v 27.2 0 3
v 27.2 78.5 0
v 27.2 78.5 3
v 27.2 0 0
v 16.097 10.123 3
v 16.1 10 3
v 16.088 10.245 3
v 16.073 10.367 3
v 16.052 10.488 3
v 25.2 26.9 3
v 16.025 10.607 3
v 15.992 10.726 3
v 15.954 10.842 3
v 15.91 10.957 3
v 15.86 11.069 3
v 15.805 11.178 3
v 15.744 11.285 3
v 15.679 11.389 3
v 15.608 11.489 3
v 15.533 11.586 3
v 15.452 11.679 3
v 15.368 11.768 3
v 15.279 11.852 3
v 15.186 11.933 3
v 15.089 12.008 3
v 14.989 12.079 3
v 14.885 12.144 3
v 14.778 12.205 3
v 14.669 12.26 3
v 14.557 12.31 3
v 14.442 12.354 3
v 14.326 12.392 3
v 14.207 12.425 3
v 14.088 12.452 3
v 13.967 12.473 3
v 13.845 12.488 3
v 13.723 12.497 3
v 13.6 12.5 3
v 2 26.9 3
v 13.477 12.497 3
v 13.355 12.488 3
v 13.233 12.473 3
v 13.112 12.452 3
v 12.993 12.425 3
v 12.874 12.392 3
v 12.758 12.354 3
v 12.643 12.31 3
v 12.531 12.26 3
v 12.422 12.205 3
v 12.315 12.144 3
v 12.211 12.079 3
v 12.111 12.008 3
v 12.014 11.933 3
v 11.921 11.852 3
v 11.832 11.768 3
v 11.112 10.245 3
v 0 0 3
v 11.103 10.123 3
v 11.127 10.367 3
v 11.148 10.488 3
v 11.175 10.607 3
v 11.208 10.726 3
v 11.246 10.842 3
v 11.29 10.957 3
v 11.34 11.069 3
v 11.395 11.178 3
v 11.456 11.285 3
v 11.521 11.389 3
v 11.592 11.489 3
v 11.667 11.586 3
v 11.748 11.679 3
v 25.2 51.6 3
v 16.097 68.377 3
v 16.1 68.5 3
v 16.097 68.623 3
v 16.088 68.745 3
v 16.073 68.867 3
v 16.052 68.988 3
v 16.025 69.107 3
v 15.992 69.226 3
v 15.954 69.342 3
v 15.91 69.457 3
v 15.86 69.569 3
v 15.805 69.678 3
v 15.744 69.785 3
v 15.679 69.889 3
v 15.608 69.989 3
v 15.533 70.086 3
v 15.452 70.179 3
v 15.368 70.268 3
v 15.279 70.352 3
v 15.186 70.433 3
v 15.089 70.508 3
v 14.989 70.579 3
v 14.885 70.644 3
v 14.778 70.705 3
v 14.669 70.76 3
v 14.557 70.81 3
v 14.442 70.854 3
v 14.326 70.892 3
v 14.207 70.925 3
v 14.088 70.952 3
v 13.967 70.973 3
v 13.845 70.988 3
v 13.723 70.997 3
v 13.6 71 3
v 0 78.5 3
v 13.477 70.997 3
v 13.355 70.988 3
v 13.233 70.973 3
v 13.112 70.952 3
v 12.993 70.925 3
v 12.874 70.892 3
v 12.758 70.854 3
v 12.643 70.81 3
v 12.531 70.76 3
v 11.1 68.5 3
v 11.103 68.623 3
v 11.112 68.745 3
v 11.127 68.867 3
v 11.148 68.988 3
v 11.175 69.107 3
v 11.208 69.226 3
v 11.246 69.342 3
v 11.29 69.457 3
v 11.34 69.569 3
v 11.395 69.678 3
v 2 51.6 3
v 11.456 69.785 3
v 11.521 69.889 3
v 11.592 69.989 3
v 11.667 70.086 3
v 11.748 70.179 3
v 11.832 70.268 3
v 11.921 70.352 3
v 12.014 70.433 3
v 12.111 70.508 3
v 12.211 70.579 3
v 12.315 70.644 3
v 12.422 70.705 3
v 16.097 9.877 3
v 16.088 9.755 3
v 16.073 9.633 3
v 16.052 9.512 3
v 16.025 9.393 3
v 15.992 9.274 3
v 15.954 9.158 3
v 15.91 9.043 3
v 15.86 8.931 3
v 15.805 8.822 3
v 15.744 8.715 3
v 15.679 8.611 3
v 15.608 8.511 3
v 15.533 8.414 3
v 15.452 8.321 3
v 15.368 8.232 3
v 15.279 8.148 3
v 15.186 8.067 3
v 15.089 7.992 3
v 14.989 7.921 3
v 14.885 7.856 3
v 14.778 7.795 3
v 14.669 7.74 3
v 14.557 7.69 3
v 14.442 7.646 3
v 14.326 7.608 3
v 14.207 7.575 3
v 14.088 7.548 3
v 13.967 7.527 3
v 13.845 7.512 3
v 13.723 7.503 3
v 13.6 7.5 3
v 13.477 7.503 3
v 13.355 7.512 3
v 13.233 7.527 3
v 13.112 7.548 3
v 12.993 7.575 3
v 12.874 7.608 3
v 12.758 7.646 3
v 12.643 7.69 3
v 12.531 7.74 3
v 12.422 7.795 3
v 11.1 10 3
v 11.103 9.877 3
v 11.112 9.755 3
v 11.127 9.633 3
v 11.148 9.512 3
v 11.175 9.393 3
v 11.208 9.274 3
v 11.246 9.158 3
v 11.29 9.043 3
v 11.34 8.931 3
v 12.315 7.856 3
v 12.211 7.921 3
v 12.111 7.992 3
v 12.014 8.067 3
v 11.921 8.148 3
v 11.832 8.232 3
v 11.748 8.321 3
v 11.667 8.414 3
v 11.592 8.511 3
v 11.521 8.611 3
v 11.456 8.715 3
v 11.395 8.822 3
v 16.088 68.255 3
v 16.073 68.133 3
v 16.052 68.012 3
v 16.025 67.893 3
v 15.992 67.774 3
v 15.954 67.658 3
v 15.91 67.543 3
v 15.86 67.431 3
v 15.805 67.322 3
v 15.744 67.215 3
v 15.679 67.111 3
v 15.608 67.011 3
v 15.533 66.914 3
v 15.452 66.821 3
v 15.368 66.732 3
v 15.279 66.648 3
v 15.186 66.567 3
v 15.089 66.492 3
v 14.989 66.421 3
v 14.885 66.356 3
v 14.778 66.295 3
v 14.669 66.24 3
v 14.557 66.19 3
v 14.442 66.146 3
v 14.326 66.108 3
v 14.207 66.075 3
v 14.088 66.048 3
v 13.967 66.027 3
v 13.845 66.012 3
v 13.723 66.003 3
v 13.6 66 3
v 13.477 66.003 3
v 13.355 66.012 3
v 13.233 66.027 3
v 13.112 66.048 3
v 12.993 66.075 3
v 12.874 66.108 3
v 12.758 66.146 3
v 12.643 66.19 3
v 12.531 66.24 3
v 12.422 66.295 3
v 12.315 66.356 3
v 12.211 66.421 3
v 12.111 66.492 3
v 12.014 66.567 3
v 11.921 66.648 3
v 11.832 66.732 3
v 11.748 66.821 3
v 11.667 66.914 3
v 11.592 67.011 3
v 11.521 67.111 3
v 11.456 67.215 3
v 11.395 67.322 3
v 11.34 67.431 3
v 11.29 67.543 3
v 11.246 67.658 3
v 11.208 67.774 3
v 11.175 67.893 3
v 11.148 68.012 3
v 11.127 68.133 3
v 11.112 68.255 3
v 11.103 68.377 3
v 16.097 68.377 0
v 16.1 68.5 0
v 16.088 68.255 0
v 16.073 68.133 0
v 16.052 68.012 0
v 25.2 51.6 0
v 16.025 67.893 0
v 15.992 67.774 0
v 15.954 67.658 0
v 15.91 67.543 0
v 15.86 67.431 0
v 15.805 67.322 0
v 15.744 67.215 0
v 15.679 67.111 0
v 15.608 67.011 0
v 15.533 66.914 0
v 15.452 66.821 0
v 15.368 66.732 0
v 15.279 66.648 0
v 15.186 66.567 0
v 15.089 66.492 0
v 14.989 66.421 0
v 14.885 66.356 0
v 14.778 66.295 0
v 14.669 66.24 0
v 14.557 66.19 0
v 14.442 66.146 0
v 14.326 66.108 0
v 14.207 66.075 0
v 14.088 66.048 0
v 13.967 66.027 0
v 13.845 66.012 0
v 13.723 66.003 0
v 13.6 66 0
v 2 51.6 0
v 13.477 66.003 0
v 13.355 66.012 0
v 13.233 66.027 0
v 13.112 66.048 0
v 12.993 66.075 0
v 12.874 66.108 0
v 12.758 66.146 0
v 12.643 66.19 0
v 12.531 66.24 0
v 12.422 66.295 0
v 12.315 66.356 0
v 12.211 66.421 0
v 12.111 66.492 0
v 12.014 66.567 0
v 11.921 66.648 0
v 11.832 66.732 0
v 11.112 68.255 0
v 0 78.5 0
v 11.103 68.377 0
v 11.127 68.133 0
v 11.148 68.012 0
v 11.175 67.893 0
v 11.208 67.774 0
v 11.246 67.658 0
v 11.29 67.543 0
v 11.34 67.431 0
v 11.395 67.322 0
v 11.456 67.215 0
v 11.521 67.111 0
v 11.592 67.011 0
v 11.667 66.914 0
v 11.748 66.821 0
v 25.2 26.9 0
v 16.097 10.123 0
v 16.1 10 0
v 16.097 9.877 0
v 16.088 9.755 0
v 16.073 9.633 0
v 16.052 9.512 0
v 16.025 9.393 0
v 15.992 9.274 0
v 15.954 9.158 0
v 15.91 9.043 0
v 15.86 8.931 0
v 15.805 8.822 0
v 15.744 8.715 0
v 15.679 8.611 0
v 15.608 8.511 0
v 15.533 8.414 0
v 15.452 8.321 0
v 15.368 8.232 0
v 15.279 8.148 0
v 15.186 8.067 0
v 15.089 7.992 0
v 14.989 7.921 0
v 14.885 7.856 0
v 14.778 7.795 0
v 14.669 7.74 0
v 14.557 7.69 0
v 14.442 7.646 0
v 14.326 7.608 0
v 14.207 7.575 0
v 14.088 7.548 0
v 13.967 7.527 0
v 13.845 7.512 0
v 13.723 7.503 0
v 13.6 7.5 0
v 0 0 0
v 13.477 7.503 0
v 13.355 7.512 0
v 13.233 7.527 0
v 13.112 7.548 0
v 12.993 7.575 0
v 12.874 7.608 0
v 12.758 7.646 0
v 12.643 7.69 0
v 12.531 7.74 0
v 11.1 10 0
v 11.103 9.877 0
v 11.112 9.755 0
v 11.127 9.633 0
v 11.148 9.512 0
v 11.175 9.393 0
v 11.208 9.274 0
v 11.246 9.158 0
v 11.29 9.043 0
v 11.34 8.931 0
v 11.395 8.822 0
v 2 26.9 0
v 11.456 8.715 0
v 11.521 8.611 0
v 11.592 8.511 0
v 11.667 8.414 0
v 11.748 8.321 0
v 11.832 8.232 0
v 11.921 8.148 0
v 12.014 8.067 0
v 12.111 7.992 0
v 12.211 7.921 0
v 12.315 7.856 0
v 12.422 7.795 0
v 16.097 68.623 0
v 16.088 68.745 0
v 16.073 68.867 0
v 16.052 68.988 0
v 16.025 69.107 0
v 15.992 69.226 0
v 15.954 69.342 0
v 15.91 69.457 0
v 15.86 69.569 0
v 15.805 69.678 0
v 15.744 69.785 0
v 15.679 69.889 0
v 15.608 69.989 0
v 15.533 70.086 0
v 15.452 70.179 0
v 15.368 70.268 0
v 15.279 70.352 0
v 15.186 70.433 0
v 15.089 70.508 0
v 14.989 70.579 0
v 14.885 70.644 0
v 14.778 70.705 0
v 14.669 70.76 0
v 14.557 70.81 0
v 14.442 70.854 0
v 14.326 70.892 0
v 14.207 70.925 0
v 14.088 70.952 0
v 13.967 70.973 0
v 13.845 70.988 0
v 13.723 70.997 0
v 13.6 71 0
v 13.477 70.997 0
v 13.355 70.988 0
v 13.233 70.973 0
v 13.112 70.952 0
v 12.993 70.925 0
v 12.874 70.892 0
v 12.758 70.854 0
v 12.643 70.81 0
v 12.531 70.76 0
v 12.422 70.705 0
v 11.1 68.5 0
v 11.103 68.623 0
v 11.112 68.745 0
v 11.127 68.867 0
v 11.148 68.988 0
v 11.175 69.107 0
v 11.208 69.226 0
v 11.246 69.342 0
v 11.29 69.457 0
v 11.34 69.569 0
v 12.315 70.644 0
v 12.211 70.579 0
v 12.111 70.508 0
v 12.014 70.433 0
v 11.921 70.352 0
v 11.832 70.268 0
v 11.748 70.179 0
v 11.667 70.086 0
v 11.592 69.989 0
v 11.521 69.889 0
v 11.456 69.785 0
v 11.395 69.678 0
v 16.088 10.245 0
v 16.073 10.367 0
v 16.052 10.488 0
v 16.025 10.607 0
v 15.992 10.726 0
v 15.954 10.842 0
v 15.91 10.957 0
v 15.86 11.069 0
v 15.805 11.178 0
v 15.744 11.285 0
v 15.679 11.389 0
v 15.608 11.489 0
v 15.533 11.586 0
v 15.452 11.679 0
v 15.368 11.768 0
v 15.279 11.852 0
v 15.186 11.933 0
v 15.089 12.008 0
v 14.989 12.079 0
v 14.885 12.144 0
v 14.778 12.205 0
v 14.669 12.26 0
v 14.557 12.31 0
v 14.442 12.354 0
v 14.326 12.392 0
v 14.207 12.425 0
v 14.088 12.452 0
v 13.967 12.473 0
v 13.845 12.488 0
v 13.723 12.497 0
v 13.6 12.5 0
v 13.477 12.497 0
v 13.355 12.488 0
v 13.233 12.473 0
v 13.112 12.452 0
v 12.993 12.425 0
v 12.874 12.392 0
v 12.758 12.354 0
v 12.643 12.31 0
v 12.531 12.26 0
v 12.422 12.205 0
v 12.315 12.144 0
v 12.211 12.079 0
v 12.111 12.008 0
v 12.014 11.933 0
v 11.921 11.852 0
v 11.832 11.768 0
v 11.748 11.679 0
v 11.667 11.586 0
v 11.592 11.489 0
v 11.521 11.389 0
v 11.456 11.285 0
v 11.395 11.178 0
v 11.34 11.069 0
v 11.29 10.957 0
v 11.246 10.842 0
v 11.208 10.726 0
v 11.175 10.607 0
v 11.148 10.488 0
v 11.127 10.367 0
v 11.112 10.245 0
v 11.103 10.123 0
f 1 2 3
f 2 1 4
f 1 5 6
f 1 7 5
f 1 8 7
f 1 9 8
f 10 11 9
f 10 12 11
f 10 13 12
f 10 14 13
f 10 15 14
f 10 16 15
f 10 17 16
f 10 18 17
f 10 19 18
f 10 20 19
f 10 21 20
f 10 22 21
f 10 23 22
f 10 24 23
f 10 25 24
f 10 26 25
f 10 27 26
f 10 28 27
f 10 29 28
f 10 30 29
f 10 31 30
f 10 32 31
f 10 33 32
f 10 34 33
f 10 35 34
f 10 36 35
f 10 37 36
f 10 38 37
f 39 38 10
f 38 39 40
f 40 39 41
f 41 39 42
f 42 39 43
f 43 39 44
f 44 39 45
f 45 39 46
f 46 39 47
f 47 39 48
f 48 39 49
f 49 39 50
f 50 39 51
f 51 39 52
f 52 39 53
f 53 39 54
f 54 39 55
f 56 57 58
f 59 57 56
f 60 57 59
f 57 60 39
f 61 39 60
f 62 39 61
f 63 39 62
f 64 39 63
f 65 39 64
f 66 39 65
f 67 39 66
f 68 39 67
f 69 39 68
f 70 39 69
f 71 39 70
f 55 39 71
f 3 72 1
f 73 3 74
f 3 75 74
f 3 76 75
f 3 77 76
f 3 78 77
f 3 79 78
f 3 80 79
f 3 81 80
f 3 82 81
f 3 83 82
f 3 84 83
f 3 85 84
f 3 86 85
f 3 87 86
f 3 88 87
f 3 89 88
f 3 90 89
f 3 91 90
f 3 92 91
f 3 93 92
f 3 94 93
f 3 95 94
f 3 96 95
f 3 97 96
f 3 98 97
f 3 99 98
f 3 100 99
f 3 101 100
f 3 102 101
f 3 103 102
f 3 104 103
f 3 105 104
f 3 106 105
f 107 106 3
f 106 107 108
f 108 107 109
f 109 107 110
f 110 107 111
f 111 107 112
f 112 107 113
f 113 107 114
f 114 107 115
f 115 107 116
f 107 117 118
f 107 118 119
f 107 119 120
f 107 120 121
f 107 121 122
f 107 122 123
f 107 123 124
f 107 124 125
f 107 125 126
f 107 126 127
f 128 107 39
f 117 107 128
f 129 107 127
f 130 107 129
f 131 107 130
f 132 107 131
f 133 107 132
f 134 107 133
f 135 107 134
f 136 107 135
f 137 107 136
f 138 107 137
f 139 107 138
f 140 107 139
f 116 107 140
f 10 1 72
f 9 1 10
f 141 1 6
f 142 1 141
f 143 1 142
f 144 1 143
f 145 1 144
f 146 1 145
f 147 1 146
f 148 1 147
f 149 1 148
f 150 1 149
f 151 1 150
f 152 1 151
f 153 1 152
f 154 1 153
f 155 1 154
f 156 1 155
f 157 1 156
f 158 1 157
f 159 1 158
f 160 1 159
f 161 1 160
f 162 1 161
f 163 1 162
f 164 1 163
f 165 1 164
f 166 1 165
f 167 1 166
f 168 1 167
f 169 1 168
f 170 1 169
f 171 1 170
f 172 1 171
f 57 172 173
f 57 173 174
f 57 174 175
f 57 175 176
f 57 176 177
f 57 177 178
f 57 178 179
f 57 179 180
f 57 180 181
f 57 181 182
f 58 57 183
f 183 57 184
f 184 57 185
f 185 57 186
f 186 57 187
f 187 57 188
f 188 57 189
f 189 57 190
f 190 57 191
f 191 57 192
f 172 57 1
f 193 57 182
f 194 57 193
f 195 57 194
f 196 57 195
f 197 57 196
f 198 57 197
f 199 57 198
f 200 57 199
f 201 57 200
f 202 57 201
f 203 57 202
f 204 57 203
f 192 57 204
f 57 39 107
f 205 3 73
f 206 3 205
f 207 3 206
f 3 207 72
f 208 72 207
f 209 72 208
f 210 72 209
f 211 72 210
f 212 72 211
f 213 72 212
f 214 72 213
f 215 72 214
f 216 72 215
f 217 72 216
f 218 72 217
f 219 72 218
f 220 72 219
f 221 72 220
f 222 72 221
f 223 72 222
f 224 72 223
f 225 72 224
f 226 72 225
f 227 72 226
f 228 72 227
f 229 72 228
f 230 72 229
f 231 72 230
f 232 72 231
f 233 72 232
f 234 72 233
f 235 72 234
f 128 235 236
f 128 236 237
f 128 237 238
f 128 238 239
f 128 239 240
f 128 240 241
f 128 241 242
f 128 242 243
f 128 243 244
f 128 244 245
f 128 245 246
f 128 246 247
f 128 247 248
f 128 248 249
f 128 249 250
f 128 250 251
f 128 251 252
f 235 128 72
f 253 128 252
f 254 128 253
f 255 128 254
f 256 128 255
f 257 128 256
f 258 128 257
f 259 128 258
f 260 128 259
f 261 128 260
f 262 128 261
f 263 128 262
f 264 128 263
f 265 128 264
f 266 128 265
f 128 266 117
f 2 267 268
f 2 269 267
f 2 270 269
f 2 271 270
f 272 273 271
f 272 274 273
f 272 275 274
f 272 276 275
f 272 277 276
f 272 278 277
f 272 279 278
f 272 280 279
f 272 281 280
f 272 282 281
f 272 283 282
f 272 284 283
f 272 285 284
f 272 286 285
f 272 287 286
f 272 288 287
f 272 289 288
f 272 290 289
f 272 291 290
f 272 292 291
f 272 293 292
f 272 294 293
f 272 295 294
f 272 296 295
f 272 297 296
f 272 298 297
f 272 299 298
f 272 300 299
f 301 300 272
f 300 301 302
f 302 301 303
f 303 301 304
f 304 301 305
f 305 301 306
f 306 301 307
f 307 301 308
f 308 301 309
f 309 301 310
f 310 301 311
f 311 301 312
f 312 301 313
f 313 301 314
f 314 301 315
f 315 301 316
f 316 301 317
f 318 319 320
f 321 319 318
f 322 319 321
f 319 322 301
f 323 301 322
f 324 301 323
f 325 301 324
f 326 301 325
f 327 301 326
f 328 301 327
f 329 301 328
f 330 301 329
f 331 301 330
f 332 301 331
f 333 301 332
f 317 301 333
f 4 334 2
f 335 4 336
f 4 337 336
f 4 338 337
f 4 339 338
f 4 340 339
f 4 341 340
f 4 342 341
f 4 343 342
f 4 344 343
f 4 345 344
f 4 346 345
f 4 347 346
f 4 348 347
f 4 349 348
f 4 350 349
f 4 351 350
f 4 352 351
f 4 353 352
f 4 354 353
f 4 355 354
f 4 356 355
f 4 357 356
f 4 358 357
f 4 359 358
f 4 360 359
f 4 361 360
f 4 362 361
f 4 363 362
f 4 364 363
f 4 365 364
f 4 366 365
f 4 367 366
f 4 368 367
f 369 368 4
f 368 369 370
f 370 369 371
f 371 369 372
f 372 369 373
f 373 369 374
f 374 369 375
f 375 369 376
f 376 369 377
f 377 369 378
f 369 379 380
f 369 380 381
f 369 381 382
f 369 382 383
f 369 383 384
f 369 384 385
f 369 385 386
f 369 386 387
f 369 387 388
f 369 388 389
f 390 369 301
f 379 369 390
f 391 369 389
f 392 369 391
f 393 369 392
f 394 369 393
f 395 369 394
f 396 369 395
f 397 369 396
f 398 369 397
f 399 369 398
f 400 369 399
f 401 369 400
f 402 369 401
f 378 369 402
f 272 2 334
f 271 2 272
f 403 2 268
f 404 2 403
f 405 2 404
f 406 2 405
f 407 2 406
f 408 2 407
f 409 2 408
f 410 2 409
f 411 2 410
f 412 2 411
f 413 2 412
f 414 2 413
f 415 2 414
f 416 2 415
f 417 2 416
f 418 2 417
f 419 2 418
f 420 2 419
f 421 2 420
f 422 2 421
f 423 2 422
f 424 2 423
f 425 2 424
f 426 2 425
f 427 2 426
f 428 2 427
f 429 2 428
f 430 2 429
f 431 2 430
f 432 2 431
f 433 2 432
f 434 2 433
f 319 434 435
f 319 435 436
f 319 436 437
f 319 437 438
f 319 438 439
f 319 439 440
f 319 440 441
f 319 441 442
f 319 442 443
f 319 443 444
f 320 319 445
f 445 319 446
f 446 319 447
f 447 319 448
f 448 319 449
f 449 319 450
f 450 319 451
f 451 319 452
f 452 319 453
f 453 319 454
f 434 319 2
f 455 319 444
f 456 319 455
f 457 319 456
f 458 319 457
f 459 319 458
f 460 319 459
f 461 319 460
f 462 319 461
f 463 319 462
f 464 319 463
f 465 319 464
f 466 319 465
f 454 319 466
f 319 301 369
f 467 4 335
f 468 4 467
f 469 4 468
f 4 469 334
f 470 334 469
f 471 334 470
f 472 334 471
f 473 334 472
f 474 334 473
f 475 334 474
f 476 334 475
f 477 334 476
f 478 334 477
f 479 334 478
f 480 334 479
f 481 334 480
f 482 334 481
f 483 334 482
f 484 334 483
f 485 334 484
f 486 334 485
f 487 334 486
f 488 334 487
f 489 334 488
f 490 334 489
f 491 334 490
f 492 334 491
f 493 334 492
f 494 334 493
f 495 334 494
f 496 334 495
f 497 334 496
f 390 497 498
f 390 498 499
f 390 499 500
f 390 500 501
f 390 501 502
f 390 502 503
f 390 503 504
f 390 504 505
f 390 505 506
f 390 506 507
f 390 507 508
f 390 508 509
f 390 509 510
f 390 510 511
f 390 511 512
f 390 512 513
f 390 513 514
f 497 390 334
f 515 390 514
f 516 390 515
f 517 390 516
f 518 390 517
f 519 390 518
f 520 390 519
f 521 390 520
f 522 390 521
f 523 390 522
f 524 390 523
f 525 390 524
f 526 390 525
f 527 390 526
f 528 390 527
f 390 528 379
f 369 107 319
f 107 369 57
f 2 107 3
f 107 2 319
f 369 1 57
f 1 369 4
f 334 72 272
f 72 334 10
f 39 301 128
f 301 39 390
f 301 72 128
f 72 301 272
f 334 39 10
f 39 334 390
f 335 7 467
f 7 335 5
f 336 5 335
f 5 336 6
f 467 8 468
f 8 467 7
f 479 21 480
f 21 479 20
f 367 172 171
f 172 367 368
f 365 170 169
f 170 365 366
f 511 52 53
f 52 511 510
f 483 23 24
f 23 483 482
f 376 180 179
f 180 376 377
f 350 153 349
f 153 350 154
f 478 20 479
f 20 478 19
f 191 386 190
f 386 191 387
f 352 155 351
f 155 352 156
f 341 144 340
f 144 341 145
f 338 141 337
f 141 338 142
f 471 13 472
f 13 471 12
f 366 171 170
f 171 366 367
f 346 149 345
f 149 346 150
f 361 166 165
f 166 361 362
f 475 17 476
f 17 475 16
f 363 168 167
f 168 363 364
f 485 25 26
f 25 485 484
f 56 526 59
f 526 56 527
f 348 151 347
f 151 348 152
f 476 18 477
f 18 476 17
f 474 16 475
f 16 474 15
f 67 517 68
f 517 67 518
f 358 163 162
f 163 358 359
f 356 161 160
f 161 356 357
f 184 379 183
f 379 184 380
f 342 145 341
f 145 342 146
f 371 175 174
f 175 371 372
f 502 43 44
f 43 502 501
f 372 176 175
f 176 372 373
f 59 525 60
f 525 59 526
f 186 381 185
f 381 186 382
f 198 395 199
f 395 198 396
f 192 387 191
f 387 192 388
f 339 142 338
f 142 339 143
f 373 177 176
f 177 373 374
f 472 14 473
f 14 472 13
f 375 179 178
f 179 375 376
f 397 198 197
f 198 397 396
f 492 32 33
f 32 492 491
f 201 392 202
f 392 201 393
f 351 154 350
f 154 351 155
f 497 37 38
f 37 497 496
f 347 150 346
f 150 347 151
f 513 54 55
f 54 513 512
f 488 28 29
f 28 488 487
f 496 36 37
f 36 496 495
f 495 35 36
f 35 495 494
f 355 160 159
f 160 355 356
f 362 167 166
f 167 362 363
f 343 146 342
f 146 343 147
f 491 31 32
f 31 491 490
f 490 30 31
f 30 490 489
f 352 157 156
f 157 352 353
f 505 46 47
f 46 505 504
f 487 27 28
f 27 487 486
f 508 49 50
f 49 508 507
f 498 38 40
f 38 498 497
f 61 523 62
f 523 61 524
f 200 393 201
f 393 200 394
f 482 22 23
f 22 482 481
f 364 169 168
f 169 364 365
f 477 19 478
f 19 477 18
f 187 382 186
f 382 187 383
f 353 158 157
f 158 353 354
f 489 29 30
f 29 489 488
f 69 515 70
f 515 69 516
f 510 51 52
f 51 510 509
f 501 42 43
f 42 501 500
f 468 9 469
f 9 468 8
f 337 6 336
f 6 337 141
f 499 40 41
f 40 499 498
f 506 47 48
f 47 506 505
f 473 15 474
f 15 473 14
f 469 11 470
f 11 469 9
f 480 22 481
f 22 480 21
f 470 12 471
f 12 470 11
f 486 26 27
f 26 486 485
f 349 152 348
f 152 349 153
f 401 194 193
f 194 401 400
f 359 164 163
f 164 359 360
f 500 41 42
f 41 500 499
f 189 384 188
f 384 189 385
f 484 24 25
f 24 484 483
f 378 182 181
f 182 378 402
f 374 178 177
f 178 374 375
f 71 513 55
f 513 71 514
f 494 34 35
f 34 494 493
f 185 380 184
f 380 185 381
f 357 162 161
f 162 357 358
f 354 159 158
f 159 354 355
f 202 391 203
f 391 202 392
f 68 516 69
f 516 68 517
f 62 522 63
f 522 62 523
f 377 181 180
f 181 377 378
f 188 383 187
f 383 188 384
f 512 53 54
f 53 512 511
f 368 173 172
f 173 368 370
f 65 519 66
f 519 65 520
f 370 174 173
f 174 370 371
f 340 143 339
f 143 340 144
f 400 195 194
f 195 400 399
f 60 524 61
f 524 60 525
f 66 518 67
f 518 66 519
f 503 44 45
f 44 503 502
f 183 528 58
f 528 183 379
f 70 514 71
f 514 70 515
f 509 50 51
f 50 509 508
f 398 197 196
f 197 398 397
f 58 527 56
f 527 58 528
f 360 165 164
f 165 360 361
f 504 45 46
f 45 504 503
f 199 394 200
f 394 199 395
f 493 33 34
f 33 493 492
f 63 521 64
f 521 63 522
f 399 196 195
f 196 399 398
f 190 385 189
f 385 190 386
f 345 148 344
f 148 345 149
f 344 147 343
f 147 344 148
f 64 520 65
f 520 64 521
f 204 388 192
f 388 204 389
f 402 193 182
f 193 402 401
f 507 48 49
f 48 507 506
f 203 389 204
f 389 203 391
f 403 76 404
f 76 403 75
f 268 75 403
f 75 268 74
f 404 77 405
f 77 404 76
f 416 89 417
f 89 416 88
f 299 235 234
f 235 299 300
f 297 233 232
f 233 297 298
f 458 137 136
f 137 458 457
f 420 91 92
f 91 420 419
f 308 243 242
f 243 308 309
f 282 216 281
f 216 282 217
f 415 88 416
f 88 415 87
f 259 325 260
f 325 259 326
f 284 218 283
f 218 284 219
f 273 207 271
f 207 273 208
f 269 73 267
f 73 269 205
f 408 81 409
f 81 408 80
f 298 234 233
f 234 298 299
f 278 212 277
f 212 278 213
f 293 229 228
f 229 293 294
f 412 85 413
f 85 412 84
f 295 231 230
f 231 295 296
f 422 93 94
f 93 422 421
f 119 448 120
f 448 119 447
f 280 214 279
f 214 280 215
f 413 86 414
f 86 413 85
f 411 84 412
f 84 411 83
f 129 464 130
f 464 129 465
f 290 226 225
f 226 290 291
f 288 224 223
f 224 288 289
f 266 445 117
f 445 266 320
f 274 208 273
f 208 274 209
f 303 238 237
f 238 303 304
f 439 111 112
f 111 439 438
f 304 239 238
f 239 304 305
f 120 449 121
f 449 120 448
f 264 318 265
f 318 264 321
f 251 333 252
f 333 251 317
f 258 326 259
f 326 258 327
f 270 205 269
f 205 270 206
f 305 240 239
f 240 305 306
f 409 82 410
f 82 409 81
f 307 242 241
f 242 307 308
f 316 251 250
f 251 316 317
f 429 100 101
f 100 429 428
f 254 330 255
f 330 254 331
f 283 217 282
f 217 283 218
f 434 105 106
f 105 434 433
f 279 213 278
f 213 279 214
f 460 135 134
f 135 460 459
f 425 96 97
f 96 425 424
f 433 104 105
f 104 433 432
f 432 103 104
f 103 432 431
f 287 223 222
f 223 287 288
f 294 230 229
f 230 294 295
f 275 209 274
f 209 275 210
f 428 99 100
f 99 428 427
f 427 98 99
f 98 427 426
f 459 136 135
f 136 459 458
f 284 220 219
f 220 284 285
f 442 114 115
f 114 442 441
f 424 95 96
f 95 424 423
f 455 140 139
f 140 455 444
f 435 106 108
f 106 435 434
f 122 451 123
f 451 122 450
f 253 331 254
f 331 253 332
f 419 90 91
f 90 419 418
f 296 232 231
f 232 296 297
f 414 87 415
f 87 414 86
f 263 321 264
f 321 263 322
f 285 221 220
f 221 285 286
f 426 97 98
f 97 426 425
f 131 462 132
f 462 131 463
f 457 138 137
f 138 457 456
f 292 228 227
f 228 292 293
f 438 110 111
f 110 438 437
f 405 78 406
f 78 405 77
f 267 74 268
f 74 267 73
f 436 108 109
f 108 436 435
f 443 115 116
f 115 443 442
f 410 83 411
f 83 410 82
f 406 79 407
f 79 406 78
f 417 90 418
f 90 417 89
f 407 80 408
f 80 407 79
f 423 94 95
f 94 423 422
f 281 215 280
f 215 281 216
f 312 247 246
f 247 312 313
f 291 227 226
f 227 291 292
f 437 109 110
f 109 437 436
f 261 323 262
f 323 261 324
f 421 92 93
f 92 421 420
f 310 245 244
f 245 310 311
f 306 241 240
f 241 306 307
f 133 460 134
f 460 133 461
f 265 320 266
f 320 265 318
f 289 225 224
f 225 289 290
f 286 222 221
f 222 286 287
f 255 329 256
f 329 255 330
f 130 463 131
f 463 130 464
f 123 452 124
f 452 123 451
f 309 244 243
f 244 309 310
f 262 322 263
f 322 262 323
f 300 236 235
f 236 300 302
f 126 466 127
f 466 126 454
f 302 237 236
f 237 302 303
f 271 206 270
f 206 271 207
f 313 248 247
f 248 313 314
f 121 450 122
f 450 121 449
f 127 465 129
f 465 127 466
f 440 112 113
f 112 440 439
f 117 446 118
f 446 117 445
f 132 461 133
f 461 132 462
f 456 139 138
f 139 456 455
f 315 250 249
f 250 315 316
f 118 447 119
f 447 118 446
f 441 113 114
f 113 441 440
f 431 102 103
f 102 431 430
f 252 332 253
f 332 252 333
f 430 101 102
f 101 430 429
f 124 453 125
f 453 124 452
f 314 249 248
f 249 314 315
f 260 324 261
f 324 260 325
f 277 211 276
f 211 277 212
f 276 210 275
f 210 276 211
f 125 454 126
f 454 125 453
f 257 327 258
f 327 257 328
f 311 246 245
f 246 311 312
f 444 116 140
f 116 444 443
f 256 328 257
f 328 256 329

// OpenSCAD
// RJ45-ramme
$fn = $preview ? 32 : 128;

feste = 20;

inner_h = 24.7;
inner_w = 23.2;
inner_d = 3;

outer_h = 38.5;
outer_w = inner_w+4;
outer_d = inner_d;

bleed = 0.2;

skinne = 20;
monteringshull = 5;

difference() {
    cube([outer_w, outer_h+skinne*2, outer_d]);
    translate([(outer_w-inner_w)/2,(outer_h-inner_h)/2+20,(outer_d-inner_d)/2]) {
        cube([inner_w, inner_h, inner_d]);
    }        
    translate([outer_w/2,skinne/2,0]) {
        rotate([0,0,0]) {
            cylinder(d=monteringshull, h=inner_d);
        }
    }
    translate([outer_w/2,outer_h+skinne*1.5,0]) {
        rotate([0,0,0]) {
            cylinder(d=monteringshull, h=inner_d);
        }
    }
}
/*
translate([0, skinne, inner_d]) {
    cube([outer_w, outer_h, outer_d+30]);
}
*/
